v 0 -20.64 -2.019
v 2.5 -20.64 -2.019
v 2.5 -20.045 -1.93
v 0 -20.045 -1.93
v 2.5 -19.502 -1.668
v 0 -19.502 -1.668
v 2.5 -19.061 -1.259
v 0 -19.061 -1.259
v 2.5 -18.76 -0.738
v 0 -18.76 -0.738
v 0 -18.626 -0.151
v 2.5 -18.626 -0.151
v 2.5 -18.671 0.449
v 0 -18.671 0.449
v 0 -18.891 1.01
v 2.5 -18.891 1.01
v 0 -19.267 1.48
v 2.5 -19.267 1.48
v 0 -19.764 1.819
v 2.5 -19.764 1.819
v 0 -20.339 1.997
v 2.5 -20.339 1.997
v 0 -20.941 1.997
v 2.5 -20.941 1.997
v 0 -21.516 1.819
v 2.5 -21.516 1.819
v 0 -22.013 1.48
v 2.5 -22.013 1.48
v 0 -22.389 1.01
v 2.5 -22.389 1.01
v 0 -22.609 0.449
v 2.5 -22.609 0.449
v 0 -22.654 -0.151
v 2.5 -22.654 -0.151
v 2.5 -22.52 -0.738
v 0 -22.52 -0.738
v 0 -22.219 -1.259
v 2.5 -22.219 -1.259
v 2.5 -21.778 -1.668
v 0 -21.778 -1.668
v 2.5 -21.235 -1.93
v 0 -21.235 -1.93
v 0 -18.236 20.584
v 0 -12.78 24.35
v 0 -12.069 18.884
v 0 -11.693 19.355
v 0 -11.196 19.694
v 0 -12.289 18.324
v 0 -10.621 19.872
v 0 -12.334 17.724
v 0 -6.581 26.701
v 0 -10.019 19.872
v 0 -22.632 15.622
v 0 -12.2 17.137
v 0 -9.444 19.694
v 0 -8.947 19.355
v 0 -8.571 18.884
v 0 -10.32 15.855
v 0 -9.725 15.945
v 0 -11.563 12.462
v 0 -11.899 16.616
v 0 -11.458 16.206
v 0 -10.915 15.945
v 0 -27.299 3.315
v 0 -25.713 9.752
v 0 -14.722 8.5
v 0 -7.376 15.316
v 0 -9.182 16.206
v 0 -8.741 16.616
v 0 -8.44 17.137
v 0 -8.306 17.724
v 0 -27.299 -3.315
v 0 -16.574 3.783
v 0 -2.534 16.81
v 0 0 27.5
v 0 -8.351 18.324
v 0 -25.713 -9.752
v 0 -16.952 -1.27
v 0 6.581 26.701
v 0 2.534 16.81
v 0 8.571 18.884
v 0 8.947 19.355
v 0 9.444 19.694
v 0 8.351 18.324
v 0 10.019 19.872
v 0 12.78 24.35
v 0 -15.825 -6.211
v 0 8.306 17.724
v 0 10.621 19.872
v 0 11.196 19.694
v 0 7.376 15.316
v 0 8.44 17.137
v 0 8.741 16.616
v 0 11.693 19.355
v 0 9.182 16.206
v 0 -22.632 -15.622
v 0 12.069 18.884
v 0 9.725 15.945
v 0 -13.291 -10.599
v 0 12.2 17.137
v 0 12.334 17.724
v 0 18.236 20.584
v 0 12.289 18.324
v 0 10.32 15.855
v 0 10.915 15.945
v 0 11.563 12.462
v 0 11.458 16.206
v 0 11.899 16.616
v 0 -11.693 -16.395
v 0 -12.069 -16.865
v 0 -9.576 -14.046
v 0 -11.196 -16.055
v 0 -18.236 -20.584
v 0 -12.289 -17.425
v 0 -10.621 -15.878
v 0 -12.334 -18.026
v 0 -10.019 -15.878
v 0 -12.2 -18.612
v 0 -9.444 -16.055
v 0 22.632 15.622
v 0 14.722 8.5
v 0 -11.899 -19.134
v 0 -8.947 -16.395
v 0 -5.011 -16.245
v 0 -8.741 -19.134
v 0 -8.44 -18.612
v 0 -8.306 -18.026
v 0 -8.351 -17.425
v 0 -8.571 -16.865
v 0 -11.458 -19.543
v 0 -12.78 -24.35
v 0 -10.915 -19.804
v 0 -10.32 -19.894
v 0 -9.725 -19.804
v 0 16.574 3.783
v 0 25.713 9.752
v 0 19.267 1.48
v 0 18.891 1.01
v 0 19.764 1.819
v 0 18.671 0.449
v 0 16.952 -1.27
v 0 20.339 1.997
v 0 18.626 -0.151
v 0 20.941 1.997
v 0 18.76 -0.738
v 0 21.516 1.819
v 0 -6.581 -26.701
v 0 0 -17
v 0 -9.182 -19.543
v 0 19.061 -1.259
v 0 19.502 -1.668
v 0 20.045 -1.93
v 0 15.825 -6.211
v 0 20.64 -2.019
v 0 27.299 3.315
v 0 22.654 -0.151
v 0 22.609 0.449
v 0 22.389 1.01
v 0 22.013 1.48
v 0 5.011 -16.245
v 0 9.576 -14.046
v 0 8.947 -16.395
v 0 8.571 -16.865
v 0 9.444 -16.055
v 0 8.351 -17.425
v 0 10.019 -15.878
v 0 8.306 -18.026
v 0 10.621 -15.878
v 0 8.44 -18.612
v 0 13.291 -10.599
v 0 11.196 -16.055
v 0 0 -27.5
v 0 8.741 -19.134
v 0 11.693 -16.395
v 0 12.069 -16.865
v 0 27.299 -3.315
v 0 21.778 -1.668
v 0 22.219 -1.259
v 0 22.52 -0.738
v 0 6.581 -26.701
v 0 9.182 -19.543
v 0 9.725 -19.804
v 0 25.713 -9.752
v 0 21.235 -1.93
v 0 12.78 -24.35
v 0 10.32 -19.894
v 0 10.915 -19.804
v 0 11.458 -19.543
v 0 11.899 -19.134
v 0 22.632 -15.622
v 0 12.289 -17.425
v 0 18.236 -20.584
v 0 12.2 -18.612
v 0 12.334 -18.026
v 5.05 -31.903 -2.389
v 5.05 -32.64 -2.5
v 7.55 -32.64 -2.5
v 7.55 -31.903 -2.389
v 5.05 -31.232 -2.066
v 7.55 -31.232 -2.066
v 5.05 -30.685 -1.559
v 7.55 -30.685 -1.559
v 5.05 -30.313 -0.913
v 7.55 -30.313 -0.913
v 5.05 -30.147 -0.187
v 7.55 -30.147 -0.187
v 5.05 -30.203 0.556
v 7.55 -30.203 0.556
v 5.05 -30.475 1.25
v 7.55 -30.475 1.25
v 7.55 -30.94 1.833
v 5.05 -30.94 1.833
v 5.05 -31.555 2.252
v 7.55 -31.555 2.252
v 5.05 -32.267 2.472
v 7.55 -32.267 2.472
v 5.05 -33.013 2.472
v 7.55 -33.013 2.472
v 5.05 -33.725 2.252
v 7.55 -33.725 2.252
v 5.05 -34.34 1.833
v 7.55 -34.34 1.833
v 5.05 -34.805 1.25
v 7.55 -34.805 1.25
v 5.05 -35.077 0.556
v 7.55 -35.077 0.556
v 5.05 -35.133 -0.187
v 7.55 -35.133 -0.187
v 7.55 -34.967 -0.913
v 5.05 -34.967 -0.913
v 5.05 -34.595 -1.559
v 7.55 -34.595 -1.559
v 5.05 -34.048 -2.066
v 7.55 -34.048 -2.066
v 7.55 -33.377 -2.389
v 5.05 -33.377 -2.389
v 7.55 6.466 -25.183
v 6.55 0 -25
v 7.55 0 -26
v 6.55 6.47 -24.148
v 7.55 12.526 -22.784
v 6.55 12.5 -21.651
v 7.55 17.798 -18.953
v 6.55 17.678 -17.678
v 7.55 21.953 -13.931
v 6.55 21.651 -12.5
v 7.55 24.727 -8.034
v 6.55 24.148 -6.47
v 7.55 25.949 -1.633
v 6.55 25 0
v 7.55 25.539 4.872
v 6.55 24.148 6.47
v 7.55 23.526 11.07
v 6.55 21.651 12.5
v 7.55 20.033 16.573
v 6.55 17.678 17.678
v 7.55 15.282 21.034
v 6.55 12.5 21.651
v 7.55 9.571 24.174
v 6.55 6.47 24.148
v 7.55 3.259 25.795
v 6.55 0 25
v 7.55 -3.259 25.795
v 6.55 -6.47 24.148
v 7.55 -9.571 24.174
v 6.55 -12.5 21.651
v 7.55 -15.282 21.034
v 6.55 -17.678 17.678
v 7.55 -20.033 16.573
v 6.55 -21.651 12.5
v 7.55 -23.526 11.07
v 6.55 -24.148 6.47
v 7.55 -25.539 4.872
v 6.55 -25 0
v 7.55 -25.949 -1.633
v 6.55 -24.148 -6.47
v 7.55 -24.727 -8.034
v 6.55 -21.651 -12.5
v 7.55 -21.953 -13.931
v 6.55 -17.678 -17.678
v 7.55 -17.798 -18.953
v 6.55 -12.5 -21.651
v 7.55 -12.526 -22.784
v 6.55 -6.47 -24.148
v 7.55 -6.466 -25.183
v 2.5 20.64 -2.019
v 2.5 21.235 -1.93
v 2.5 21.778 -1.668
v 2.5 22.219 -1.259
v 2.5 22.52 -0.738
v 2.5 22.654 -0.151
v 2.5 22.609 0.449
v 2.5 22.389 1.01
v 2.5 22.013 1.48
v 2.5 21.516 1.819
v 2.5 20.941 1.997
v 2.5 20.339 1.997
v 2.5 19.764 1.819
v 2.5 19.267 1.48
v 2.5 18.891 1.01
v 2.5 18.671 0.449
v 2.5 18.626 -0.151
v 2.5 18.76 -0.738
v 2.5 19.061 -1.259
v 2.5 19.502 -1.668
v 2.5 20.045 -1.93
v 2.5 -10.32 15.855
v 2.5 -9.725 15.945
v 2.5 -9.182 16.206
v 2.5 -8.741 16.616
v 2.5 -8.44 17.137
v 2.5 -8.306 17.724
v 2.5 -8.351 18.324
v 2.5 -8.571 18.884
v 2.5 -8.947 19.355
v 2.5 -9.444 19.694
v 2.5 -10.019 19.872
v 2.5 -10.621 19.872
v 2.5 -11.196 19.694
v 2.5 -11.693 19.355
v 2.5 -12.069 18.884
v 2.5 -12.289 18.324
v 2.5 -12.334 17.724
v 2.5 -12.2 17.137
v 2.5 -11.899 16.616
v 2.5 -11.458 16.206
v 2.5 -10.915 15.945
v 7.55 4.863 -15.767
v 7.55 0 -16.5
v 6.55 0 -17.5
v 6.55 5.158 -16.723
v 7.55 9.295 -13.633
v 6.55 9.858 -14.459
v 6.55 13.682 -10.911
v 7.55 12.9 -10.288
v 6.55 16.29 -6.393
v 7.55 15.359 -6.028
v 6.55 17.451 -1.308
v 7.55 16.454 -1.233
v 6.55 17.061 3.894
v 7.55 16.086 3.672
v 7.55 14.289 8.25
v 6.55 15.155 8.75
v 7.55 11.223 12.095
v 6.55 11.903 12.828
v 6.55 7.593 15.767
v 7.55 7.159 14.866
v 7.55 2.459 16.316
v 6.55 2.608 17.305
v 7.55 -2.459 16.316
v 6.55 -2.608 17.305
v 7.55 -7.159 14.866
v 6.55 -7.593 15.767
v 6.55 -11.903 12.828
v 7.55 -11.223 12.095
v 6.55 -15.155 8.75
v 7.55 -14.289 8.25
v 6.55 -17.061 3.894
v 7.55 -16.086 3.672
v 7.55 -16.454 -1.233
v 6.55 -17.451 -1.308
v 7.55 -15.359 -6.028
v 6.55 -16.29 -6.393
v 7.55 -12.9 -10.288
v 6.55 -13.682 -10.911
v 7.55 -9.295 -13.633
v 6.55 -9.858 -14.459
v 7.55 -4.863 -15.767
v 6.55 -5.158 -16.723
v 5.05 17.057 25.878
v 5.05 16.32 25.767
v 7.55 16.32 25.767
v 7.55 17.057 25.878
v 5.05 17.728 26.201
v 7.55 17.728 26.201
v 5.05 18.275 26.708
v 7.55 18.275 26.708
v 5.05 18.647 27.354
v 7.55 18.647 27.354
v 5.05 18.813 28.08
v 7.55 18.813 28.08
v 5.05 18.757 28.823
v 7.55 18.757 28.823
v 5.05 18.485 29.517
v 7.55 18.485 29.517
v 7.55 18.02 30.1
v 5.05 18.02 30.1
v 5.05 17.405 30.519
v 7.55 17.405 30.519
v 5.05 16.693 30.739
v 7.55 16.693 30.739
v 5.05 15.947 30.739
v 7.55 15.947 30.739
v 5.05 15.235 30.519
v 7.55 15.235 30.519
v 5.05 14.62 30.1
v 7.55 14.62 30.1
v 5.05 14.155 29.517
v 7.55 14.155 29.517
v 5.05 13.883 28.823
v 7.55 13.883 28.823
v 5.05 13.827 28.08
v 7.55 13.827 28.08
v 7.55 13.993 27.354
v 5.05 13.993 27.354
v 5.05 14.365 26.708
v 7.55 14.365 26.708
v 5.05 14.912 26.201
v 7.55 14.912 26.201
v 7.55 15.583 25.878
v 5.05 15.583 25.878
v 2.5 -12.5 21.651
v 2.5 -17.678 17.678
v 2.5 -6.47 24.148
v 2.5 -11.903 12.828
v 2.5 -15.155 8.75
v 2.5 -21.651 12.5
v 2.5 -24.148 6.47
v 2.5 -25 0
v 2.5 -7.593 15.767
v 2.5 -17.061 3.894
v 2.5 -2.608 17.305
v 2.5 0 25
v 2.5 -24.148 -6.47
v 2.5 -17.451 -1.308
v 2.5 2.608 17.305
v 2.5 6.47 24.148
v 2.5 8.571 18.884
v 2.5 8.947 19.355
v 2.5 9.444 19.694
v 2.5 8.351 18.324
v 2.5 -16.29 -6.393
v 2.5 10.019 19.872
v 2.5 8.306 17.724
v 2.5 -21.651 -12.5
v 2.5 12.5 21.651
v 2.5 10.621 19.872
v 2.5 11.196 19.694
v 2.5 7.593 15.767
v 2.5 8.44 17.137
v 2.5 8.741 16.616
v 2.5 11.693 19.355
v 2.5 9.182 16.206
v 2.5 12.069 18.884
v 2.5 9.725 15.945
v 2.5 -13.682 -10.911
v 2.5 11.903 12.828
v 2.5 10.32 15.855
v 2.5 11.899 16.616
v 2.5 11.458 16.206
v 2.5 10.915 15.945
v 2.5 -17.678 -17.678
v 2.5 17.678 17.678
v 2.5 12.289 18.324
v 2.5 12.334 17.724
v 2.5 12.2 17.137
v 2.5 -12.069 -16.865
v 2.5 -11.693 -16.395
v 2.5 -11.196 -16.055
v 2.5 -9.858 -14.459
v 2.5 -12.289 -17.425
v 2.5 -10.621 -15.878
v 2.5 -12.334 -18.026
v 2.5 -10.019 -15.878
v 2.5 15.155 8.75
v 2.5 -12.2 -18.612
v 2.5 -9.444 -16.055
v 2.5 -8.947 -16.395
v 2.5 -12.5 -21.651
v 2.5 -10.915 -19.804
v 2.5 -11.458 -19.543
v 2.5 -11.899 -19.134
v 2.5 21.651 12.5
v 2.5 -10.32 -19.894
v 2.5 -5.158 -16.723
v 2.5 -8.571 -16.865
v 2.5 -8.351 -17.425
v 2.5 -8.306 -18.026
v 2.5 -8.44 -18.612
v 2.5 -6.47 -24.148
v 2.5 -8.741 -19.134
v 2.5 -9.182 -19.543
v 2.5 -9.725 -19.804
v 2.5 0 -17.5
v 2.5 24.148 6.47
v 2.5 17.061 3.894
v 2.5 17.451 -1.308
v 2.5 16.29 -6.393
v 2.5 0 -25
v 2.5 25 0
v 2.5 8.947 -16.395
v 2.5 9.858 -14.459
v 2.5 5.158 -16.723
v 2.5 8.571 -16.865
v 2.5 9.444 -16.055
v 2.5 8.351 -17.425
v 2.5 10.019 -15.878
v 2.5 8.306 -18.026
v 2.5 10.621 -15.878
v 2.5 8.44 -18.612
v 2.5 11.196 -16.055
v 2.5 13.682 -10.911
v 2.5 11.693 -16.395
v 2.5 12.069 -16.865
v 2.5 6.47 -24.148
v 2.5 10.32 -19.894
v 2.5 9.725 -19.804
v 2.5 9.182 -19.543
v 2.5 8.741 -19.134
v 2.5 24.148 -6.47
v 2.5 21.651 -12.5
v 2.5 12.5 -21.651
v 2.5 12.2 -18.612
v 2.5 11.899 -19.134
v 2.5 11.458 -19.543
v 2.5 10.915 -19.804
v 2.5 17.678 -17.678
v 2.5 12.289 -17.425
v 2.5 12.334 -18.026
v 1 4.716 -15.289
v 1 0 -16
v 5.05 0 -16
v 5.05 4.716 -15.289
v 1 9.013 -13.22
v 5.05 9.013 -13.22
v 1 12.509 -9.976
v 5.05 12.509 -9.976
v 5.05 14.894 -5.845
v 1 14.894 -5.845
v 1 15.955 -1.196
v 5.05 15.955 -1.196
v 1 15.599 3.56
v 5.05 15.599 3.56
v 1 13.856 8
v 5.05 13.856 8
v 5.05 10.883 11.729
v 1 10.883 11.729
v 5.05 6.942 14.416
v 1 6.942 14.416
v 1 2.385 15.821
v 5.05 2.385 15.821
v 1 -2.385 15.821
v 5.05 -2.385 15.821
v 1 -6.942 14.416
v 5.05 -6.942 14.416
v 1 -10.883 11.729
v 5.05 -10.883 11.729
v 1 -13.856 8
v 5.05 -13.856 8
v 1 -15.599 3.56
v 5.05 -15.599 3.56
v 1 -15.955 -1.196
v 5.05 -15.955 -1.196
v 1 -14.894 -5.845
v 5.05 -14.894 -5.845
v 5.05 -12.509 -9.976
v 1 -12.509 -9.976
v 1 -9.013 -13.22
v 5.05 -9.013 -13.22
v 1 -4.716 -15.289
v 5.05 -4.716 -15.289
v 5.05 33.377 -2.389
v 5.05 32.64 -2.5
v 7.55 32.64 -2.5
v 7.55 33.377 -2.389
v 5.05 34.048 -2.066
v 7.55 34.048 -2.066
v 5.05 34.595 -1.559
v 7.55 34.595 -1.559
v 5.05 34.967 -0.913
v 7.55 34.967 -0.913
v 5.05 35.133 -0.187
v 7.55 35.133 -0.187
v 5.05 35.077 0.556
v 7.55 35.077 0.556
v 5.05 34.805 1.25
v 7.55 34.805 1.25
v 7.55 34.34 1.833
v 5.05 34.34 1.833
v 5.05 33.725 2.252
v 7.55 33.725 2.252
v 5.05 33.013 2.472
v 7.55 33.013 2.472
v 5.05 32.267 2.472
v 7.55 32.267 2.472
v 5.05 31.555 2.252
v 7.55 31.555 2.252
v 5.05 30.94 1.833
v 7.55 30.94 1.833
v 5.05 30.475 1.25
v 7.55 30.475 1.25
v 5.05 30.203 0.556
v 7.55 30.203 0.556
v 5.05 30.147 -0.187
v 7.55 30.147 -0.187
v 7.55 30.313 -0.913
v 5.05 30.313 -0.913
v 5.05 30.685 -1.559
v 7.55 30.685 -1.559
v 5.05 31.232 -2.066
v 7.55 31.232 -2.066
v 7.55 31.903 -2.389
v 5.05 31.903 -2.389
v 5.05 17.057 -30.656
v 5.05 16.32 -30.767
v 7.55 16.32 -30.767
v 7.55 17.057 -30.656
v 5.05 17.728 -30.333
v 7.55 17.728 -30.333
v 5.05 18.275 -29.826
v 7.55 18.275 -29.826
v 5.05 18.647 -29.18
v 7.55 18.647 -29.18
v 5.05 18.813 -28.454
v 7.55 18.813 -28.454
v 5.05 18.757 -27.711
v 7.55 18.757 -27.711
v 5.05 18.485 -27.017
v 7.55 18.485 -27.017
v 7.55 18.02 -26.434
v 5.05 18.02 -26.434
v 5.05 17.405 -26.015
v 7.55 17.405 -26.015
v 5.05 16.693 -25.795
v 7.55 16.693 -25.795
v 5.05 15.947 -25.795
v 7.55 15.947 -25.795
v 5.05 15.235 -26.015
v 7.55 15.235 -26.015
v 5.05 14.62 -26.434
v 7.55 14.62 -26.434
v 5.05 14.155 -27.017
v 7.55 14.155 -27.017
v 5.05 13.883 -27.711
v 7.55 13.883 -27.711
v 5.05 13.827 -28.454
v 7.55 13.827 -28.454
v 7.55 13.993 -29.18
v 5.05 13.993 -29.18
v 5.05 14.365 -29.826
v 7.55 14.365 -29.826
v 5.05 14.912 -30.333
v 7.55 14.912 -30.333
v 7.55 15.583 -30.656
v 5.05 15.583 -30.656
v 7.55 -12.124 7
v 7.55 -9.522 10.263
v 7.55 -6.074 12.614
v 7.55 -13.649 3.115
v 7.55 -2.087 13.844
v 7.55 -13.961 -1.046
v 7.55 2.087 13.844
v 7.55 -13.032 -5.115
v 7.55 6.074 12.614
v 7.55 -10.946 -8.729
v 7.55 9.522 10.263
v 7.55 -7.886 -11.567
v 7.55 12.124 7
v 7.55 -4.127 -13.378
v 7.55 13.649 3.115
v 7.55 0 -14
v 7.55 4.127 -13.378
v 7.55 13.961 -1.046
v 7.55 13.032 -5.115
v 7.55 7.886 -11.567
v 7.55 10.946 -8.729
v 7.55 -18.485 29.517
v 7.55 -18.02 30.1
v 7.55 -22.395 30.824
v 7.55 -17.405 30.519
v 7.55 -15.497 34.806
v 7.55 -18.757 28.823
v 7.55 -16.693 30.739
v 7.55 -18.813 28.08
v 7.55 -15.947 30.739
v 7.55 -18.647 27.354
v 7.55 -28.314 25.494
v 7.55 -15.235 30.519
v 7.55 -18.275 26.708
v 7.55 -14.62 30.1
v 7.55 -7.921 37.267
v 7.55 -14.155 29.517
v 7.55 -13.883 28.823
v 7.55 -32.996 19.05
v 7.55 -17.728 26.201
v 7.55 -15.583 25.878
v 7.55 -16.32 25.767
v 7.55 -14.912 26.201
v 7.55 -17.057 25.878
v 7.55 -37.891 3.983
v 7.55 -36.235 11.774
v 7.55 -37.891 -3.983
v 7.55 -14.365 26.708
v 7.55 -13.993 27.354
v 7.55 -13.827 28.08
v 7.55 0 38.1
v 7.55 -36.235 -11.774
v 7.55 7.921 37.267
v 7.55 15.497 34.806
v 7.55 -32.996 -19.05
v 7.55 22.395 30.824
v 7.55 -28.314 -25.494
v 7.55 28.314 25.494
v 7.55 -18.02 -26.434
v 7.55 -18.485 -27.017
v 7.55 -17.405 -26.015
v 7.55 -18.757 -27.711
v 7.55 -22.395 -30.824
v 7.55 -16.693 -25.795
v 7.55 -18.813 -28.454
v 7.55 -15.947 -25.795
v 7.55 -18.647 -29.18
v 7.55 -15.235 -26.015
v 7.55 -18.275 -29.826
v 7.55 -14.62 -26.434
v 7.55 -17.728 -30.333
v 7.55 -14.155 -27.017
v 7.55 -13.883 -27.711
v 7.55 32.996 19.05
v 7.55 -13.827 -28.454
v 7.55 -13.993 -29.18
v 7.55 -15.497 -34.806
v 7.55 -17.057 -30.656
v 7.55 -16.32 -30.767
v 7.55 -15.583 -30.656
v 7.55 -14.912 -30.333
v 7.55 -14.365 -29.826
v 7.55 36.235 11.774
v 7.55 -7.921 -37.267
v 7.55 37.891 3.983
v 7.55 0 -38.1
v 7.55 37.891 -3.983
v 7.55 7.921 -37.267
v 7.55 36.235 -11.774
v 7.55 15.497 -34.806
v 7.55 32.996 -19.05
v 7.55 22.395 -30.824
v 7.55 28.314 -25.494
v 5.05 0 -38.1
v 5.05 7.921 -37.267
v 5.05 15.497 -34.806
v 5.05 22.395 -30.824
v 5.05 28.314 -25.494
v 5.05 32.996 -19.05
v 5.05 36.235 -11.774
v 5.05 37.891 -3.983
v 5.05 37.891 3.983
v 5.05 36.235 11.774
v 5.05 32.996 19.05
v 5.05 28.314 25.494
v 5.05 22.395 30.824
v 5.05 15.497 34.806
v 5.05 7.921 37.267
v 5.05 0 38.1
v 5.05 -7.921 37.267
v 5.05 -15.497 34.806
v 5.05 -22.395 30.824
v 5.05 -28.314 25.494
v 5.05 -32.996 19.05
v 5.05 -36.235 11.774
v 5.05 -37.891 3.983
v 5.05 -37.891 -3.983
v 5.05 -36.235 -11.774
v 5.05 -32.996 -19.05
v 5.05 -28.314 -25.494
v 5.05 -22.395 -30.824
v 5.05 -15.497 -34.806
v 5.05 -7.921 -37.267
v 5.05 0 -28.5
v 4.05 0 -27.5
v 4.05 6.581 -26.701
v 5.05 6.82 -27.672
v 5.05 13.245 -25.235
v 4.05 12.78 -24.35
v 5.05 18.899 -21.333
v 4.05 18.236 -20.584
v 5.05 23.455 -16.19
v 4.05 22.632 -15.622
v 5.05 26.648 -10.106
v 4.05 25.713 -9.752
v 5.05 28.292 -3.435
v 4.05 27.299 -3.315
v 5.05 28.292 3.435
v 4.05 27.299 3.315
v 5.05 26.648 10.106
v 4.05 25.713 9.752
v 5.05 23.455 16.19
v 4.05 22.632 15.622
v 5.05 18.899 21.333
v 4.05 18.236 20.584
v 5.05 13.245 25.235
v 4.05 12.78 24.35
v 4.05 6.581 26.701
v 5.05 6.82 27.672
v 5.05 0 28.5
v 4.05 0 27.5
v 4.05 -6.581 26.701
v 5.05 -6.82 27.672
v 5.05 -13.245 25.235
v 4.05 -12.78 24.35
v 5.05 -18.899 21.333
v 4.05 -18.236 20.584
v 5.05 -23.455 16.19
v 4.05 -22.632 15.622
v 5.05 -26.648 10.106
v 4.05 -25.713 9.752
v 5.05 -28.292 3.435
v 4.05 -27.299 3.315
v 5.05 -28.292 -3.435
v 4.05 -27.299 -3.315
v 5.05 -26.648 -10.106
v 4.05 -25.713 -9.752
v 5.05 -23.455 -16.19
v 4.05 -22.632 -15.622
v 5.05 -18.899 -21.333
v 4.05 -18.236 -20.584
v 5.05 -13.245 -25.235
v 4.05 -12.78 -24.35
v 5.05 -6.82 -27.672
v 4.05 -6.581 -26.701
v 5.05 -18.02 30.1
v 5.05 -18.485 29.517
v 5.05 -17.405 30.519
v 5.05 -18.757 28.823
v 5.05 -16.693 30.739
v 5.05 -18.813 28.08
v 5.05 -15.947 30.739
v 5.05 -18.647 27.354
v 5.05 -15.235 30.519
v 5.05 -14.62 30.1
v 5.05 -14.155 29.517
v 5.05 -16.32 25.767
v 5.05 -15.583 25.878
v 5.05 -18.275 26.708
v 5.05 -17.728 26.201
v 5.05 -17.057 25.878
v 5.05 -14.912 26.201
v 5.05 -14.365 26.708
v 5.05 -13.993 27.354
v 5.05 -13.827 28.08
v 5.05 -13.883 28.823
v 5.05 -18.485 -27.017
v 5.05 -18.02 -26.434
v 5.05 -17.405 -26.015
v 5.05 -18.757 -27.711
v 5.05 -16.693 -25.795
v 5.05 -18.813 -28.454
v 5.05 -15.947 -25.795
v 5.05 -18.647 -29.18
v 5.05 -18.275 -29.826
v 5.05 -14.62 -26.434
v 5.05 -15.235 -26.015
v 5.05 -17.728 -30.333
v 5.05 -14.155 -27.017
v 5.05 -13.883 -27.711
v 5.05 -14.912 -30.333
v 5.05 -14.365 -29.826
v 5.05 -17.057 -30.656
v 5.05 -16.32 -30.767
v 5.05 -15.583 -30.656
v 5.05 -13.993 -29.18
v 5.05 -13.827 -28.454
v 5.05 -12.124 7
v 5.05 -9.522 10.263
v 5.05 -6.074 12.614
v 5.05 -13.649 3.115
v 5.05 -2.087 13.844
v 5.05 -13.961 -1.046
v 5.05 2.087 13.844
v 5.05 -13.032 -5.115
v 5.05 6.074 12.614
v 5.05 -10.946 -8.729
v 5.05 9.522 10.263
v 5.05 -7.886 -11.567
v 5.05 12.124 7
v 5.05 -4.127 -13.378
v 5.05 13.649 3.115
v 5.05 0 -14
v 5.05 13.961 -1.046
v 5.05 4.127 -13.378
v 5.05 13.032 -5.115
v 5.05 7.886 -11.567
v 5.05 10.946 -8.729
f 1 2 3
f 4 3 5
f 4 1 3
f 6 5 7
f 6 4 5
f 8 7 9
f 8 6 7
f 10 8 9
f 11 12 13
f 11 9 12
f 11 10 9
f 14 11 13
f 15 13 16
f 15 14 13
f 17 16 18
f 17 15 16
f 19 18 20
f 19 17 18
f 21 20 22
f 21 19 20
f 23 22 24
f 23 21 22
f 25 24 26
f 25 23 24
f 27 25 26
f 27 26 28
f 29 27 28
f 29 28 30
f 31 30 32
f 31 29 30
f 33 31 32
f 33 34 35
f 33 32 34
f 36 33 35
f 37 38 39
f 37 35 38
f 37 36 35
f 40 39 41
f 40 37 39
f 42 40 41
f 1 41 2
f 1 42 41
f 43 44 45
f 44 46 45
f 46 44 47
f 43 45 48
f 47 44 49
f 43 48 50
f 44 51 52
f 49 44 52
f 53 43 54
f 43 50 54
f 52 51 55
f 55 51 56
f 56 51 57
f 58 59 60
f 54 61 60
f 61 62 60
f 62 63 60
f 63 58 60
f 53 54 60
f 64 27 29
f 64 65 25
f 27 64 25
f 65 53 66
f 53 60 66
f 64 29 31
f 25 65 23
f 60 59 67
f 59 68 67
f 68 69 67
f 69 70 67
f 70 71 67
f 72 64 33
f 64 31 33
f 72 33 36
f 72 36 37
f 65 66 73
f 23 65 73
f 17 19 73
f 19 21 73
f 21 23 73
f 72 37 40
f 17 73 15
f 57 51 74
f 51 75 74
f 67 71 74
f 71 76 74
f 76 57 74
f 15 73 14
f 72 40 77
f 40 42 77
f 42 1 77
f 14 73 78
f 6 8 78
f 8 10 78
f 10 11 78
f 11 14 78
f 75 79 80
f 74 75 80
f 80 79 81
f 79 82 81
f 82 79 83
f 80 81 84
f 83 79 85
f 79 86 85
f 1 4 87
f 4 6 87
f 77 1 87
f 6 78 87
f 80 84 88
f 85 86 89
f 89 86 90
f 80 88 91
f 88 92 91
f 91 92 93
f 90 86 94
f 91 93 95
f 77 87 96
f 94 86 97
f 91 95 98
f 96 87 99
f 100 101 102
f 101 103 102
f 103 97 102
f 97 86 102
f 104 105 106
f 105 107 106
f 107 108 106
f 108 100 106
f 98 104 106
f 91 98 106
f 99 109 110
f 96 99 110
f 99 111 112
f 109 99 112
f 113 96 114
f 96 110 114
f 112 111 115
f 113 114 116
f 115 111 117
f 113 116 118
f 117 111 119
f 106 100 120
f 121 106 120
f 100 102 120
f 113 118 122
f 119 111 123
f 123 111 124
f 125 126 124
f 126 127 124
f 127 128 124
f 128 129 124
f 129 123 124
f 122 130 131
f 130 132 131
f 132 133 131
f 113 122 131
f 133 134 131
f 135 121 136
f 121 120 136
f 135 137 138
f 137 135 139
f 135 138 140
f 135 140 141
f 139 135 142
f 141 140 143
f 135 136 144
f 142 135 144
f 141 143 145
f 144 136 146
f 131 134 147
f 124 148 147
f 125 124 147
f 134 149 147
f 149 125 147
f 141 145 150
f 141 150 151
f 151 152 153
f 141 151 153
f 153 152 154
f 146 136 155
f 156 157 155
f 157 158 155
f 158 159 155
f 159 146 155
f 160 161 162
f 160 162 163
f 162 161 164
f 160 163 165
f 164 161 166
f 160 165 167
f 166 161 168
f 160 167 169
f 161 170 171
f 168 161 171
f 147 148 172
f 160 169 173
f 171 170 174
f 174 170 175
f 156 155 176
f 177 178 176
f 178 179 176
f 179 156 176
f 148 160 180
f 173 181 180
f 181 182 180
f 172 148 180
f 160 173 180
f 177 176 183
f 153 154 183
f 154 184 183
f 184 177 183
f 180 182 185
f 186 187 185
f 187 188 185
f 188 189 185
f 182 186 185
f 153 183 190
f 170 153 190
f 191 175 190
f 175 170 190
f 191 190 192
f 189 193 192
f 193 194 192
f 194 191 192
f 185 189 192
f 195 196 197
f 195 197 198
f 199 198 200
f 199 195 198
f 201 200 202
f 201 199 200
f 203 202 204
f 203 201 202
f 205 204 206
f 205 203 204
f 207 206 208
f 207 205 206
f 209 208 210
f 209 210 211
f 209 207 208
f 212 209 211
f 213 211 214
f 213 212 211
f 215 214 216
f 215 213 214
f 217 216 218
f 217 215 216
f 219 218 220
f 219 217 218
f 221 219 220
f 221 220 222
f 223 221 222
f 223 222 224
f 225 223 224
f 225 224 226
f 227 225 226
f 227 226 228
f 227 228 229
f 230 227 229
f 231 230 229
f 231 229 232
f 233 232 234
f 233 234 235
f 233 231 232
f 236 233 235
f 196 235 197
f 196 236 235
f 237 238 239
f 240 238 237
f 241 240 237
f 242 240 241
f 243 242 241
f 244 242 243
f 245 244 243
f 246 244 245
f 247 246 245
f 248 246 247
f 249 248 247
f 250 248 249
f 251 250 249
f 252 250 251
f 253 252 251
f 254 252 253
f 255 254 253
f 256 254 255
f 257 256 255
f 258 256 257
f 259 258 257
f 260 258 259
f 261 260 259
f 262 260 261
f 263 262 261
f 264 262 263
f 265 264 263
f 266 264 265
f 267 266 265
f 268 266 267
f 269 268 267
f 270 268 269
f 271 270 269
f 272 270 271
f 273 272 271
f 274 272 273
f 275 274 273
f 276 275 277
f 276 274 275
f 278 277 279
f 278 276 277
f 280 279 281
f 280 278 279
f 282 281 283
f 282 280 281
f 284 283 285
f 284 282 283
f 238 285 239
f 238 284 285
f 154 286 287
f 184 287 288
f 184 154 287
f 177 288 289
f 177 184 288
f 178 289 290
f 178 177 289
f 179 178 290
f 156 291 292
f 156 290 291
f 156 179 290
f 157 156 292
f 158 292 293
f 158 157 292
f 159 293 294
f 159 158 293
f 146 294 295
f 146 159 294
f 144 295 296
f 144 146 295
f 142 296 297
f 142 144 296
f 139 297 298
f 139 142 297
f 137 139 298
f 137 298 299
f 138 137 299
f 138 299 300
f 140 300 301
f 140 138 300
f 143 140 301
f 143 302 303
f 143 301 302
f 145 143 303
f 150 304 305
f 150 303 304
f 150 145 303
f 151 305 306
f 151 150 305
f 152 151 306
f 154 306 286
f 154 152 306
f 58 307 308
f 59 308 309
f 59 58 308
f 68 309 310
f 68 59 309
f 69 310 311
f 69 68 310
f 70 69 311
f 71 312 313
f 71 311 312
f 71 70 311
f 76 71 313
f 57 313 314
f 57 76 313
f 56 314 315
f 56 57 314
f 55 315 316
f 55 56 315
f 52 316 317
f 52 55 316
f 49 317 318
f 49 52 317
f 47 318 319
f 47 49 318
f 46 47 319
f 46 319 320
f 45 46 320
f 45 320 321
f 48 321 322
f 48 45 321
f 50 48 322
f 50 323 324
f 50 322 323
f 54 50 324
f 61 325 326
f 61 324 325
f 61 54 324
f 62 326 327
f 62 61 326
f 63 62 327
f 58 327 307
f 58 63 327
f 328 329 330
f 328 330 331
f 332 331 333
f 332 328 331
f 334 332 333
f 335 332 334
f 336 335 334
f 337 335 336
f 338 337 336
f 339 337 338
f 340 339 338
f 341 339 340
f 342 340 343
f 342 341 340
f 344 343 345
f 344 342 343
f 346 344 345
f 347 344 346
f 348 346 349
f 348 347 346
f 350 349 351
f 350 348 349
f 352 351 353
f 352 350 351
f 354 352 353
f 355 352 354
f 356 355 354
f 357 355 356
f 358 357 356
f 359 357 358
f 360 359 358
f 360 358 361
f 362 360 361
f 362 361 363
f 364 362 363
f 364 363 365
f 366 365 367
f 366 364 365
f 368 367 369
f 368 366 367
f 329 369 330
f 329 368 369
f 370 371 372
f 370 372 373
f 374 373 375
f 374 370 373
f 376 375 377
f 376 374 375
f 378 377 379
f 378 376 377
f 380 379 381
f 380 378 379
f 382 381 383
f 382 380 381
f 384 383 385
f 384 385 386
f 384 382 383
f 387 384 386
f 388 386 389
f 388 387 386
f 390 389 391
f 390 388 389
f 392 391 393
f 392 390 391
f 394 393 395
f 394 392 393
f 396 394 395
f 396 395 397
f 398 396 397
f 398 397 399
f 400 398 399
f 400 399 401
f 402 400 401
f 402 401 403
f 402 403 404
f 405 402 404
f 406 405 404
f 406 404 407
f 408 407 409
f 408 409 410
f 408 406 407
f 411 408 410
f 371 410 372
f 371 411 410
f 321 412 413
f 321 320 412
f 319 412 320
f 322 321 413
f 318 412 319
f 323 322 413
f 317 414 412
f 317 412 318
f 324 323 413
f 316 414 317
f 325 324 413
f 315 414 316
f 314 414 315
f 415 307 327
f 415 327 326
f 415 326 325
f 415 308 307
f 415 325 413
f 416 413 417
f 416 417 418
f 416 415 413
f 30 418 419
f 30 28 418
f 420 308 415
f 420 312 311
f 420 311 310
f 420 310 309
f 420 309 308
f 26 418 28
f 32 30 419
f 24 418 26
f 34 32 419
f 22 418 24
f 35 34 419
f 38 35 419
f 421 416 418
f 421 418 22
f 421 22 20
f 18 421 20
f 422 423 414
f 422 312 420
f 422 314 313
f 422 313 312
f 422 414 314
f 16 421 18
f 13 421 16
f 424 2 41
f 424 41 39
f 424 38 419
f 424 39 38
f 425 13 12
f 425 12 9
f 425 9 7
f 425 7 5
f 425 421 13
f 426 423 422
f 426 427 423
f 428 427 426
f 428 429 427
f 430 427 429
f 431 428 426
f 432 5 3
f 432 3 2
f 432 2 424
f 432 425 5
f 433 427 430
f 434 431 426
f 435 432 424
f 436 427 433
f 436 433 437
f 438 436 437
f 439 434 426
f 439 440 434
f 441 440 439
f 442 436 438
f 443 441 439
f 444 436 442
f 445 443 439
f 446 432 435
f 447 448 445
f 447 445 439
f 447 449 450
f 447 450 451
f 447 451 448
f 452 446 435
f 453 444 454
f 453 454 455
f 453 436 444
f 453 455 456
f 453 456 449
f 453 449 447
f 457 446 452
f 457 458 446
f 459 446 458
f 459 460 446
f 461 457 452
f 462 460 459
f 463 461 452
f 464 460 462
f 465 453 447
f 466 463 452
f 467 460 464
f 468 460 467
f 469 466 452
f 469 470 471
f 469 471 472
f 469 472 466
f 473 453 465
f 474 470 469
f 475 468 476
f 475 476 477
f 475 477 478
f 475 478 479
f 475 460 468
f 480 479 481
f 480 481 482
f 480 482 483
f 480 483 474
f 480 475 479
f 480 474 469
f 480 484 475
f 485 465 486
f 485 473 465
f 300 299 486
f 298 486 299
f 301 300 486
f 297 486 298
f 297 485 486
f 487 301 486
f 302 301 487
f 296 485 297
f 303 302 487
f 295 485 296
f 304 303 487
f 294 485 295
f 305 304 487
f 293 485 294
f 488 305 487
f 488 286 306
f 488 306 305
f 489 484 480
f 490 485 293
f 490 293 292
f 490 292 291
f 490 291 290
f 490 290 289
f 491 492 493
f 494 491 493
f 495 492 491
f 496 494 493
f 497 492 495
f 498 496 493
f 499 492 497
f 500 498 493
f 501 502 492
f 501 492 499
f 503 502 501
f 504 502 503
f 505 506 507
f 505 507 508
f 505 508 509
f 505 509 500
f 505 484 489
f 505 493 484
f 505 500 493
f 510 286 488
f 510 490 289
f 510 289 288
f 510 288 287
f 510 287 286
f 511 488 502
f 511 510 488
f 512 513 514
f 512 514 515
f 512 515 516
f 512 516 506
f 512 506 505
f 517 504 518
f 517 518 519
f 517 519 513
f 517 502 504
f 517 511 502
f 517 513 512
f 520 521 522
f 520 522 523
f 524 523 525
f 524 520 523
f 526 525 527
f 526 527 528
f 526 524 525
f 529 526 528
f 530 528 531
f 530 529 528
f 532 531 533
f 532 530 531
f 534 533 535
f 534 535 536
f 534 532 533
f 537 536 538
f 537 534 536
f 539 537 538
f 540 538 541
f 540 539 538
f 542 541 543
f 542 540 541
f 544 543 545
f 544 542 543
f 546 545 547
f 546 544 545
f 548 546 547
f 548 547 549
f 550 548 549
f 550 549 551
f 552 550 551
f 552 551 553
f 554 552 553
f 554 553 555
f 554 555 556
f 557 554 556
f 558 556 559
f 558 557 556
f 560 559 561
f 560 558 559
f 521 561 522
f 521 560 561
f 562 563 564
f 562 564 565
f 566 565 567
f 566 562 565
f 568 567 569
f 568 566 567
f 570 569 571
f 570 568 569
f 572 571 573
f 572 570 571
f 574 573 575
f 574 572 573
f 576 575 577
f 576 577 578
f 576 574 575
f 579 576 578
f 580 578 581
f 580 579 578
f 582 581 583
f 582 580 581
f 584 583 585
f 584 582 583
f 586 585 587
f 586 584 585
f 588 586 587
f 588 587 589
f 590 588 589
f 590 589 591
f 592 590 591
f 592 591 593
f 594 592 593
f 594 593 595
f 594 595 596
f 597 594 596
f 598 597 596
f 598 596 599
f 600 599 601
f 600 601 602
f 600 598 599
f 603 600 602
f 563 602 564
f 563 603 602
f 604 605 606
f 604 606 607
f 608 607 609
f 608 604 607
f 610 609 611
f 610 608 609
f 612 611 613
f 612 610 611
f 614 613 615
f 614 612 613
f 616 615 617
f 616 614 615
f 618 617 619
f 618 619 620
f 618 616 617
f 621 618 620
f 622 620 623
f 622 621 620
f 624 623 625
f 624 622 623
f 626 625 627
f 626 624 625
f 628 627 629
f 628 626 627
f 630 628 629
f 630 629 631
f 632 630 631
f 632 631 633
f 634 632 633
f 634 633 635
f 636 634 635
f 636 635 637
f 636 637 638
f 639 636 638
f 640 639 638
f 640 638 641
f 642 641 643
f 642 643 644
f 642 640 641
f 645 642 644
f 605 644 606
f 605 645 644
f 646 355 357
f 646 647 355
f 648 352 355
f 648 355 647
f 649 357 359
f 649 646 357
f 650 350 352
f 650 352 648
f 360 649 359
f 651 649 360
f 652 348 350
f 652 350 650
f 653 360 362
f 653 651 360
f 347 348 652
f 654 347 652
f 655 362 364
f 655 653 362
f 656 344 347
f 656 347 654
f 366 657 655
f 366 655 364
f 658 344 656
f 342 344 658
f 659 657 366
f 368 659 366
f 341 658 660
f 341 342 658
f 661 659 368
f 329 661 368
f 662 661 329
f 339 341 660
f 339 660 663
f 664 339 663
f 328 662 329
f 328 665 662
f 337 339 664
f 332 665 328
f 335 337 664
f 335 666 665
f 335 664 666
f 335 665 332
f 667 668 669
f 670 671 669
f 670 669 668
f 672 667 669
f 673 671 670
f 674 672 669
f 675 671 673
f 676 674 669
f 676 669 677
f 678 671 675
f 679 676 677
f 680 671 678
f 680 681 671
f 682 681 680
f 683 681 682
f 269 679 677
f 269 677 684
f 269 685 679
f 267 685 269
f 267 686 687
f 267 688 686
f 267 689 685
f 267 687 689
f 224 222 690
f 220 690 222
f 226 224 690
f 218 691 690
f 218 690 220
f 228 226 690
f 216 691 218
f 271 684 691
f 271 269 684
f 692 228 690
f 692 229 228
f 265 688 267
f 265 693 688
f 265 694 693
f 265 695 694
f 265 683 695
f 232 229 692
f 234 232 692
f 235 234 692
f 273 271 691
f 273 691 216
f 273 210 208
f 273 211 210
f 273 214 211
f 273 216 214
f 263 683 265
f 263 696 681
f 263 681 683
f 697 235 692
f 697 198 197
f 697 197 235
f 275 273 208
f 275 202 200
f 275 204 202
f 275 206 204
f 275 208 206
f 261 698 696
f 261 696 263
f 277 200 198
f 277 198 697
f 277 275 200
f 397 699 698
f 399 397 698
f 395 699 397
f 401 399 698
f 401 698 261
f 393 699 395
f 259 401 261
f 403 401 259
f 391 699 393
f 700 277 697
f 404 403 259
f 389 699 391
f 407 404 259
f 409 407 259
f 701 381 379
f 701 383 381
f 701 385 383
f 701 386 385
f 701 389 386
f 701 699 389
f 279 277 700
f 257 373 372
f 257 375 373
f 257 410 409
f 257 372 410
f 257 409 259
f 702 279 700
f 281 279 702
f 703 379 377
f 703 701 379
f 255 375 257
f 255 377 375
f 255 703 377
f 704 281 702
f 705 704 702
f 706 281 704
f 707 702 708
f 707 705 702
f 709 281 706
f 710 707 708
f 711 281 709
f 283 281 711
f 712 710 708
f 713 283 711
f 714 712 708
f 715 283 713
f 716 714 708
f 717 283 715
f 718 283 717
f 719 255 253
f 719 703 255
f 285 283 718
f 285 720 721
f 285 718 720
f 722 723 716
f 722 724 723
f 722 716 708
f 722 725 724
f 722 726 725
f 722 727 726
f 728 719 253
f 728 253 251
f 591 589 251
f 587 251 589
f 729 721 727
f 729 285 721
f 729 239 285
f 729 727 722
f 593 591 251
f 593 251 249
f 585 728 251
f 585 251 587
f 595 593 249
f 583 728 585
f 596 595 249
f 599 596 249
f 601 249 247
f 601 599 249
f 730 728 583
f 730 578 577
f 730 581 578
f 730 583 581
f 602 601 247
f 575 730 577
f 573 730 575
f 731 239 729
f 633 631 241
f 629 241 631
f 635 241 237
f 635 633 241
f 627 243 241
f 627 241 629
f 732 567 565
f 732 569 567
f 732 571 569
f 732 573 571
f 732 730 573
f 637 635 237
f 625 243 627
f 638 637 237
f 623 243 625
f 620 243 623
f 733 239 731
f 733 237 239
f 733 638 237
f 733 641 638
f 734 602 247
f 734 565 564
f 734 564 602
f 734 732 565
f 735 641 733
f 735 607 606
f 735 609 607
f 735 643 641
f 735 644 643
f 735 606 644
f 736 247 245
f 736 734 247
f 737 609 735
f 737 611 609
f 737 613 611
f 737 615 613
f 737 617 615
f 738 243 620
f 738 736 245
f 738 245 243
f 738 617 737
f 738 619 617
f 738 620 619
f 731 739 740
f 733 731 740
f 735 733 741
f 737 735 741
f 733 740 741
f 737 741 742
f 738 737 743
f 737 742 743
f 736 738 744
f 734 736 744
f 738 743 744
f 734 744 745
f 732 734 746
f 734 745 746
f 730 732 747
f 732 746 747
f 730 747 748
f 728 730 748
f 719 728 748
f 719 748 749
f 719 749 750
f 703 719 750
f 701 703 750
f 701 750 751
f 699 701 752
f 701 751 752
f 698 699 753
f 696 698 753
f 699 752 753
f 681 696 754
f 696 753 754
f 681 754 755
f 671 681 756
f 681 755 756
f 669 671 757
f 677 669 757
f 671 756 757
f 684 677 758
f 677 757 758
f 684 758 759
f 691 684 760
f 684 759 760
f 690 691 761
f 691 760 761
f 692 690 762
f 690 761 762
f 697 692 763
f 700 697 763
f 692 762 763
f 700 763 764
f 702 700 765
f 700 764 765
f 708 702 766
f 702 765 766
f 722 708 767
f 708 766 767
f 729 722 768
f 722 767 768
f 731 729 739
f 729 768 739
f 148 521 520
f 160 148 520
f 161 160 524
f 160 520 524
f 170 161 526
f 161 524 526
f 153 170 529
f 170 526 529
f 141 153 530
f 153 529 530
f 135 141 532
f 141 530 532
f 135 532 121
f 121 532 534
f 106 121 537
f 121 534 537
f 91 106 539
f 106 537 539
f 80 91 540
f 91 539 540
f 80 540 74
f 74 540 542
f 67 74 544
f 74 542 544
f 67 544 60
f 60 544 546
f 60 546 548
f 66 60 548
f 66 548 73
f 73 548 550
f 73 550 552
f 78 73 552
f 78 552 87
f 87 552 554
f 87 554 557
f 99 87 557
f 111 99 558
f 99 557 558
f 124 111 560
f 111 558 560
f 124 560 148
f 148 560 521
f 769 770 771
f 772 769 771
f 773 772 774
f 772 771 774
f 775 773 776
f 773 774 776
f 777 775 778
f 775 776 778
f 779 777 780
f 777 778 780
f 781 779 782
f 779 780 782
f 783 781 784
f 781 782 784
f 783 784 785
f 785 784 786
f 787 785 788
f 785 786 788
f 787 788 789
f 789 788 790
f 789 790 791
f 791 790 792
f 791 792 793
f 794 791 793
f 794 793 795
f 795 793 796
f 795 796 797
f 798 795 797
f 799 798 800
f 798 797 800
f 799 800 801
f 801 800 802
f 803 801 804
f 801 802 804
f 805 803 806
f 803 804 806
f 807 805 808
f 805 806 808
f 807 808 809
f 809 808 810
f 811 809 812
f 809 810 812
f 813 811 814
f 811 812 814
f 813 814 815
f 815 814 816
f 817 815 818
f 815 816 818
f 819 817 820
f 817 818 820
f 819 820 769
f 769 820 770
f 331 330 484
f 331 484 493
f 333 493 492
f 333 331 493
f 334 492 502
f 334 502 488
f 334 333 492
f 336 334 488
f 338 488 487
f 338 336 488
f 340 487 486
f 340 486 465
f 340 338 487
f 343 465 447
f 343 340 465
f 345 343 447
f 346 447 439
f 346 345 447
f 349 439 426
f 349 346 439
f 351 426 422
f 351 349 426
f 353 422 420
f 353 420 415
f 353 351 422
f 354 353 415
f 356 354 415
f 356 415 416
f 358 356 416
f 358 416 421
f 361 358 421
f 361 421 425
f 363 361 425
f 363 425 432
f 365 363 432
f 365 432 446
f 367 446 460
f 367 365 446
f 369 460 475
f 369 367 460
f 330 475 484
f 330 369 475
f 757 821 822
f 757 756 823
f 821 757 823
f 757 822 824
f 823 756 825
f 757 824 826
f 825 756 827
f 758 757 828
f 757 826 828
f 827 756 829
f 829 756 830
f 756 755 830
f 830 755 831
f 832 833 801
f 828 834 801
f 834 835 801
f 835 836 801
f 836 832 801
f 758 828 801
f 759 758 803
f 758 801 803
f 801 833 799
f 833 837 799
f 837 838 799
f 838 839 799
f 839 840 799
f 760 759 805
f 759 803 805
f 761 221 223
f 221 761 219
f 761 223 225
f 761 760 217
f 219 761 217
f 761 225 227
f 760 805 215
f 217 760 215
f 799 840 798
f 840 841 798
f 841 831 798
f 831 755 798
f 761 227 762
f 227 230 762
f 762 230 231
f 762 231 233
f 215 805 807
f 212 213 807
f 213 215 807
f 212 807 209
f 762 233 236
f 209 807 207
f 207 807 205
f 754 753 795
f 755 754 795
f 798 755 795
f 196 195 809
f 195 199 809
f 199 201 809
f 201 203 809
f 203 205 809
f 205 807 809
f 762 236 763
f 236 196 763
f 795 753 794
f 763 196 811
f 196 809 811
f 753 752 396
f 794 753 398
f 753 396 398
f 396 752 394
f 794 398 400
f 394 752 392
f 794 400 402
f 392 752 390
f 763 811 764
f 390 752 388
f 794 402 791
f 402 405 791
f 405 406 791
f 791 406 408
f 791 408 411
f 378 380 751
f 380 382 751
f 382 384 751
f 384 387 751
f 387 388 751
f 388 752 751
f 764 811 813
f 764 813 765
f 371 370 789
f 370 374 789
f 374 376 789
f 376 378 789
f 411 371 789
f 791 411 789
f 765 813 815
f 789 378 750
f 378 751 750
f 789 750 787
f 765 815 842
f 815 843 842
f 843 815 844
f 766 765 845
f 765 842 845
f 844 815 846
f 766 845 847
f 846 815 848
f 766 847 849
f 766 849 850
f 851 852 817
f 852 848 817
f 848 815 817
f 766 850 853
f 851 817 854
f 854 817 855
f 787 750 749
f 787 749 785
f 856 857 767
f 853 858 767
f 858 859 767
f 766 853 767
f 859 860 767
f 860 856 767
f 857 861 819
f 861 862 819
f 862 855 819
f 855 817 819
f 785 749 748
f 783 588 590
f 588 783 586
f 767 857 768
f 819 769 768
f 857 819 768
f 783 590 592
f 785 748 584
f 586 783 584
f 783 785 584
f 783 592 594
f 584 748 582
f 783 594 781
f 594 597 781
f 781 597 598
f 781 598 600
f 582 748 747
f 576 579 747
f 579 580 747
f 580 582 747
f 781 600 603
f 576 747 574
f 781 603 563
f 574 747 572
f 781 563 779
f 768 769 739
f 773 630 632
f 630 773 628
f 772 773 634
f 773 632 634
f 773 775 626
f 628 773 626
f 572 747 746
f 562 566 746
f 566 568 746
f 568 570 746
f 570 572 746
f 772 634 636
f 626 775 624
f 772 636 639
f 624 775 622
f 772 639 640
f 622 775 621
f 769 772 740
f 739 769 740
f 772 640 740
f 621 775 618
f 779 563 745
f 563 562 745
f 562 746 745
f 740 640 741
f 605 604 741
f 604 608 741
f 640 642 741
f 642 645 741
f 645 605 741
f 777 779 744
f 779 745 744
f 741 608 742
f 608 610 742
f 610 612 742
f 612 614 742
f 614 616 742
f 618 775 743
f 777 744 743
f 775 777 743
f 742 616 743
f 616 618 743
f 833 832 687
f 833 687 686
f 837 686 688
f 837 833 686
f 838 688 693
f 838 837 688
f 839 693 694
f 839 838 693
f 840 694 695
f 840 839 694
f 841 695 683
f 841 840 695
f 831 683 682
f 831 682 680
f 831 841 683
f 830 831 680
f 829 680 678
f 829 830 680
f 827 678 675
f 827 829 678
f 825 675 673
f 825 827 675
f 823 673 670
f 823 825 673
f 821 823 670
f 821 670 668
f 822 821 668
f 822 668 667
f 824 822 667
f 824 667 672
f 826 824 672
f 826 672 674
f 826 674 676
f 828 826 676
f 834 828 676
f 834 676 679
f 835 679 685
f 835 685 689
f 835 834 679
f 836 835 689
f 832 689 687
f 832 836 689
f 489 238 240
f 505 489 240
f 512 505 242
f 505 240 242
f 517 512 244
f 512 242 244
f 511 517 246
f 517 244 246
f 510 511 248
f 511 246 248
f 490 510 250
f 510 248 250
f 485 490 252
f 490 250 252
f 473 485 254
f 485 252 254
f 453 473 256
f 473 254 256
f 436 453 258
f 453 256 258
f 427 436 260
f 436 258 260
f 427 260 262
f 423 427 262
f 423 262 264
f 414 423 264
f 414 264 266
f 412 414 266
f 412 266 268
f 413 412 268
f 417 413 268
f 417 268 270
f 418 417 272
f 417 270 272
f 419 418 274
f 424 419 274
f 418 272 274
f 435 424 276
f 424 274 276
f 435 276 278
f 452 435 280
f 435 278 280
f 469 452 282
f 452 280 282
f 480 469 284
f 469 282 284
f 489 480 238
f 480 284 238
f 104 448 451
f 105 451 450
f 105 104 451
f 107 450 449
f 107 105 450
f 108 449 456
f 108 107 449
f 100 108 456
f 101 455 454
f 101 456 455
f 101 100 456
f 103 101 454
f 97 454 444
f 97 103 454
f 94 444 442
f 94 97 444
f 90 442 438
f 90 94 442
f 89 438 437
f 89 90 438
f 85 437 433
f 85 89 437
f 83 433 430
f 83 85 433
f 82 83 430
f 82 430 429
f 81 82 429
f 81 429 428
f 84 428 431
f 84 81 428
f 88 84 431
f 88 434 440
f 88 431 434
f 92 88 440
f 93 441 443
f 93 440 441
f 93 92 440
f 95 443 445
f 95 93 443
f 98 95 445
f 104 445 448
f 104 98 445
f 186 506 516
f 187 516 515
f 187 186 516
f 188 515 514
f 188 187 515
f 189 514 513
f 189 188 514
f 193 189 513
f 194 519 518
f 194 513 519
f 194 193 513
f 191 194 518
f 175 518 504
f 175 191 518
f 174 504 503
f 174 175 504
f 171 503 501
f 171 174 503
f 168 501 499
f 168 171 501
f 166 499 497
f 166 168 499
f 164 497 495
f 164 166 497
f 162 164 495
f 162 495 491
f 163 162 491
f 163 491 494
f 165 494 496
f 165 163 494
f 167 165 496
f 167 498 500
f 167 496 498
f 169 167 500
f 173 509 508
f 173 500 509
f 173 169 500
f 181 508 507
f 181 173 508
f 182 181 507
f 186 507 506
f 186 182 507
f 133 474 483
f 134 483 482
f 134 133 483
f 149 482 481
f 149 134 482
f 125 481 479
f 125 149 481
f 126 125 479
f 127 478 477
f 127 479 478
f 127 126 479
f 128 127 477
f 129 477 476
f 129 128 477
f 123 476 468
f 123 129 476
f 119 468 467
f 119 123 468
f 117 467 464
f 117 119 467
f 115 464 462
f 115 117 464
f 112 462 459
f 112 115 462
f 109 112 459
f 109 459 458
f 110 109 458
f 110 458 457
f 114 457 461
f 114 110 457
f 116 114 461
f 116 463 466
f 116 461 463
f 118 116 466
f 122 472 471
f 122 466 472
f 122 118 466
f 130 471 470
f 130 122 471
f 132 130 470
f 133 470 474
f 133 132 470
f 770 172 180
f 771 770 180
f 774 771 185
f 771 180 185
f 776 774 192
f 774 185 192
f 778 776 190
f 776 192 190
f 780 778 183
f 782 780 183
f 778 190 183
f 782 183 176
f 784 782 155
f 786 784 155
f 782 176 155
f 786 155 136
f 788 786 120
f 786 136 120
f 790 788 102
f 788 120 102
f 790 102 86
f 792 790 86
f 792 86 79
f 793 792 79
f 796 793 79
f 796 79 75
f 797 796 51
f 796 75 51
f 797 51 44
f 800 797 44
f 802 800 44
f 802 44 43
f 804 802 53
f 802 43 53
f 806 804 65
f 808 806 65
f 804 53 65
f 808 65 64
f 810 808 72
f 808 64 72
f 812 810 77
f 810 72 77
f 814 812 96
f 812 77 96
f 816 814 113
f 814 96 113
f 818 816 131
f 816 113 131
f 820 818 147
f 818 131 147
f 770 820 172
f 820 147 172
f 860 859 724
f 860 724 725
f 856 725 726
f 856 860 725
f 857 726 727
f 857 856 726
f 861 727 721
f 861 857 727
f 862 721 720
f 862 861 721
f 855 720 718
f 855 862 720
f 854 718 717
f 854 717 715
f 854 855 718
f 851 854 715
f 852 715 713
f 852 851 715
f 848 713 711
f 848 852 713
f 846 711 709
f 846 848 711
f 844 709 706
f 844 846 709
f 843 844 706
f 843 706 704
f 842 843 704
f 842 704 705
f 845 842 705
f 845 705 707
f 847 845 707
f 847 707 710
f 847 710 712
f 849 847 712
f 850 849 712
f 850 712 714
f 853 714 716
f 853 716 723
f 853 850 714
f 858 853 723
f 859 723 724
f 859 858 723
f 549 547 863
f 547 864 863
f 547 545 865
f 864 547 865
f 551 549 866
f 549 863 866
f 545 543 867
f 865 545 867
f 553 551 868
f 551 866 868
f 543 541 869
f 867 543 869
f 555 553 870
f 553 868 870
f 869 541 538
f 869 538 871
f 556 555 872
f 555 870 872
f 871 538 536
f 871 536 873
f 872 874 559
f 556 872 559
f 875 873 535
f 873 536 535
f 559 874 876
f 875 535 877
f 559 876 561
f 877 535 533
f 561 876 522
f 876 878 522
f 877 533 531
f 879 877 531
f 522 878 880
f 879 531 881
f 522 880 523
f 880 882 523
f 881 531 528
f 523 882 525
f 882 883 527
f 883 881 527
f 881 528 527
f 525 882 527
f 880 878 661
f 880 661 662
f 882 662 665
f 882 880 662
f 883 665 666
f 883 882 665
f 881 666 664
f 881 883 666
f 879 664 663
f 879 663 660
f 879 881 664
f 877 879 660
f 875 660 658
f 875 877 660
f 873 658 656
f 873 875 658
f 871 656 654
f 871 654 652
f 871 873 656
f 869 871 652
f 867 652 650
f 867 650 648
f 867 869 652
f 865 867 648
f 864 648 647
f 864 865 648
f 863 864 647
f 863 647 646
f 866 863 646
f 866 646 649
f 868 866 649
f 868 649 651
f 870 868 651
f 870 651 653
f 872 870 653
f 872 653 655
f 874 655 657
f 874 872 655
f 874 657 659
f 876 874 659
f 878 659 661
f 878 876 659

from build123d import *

# Parameters (mm, degrees)
SKETCH1_R           = 27.5
SKETCH1_R_2         = 2.0193
SKETCH1_R_3         = 16
BOSS_EXTRUDE1_DEPTH = 5.05
SKETCH2_R           = 38.1
SKETCH2_R_2         = 2.0193
SKETCH2_R_3         = 14
SKETCH2_R_4         = 2.5
BOSS_EXTRUDE2_DEPTH = 2.5
SKETCH3_R           = 25
SKETCH3_R_2         = 17.5
CUT_EXTRUDE1_DEPTH  = 5.05
CHAMFER1_SIZE       = 1


with BuildPart() as part:
    # Sketch1 → Boss-Extrude1 (new body)
    with BuildSketch(Plane(origin=(0, 0, 0), x_dir=(0, 0, -1), z_dir=(1, 0, 0))):
        Circle(SKETCH1_R)
        with Locations((0, 20.64)):
            Circle(SKETCH1_R_2, mode=Mode.SUBTRACT)
        with Locations((17.874764334, 10.32)):
            Circle(SKETCH1_R_2, mode=Mode.SUBTRACT)
        with Locations((17.874764334, -10.32)):
            Circle(SKETCH1_R_2, mode=Mode.SUBTRACT)
        with Locations((0, -20.64)):
            Circle(SKETCH1_R_2, mode=Mode.SUBTRACT)
        with Locations((-17.874764334, -10.32)):
            Circle(SKETCH1_R_2, mode=Mode.SUBTRACT)
        with Locations((-17.874764334, 10.32)):
            Circle(SKETCH1_R_2, mode=Mode.SUBTRACT)
        Circle(SKETCH1_R_3, mode=Mode.SUBTRACT)
    extrude(amount=BOSS_EXTRUDE1_DEPTH)

    # Sketch2 → Boss-Extrude2 (add)
    with BuildSketch(Plane(origin=(5.05, 0, 0), x_dir=(0, 0, -1), z_dir=(1, 0, 0))):
        Circle(SKETCH2_R)
        with Locations((0, 20.64)):
            Circle(SKETCH2_R_2, mode=Mode.SUBTRACT)
        Circle(SKETCH2_R_3, mode=Mode.SUBTRACT)
        with Locations((17.874764334, 10.32)):
            Circle(SKETCH2_R_2, mode=Mode.SUBTRACT)
        with Locations((17.874764334, -10.32)):
            Circle(SKETCH2_R_2, mode=Mode.SUBTRACT)
        with Locations((0, -20.64)):
            Circle(SKETCH2_R_2, mode=Mode.SUBTRACT)
        with Locations((-17.874764334, -10.32)):
            Circle(SKETCH2_R_2, mode=Mode.SUBTRACT)
        with Locations((-17.874764334, 10.32)):
            Circle(SKETCH2_R_2, mode=Mode.SUBTRACT)
        with Locations((0, 32.64)):
            Circle(SKETCH2_R_4, mode=Mode.SUBTRACT)
        with Locations((28.26706918, 16.32)):
            Circle(SKETCH2_R_4, mode=Mode.SUBTRACT)
        with Locations((28.26706918, -16.32)):
            Circle(SKETCH2_R_4, mode=Mode.SUBTRACT)
        with Locations((0, -32.64)):
            Circle(SKETCH2_R_4, mode=Mode.SUBTRACT)
        with Locations((-28.26706918, -16.32)):
            Circle(SKETCH2_R_4, mode=Mode.SUBTRACT)
        with Locations((-28.26706918, 16.32)):
            Circle(SKETCH2_R_4, mode=Mode.SUBTRACT)
    extrude(amount=BOSS_EXTRUDE2_DEPTH)

    # Sketch3 → Cut-Extrude1 (cut)
    with BuildSketch(Plane(origin=(7.55, 0, 0), x_dir=(0, 0, -1), z_dir=(1, 0, 0))):
        Circle(SKETCH3_R)
        Circle(SKETCH3_R_2, mode=Mode.SUBTRACT)
    extrude(amount=-CUT_EXTRUDE1_DEPTH, mode=Mode.SUBTRACT)

    # Chamfer1
    chamfer1_edges = [part.edges().sort_by_distance(p)[0] for p in [
        (5.05, 0, 27.5),
        (7.55, 0, 25),
        (7.55, 0, 17.5),
        (0, 0, 16),
    ]]
    chamfer(chamfer1_edges, length=CHAMFER1_SIZE)


solid = part.part
